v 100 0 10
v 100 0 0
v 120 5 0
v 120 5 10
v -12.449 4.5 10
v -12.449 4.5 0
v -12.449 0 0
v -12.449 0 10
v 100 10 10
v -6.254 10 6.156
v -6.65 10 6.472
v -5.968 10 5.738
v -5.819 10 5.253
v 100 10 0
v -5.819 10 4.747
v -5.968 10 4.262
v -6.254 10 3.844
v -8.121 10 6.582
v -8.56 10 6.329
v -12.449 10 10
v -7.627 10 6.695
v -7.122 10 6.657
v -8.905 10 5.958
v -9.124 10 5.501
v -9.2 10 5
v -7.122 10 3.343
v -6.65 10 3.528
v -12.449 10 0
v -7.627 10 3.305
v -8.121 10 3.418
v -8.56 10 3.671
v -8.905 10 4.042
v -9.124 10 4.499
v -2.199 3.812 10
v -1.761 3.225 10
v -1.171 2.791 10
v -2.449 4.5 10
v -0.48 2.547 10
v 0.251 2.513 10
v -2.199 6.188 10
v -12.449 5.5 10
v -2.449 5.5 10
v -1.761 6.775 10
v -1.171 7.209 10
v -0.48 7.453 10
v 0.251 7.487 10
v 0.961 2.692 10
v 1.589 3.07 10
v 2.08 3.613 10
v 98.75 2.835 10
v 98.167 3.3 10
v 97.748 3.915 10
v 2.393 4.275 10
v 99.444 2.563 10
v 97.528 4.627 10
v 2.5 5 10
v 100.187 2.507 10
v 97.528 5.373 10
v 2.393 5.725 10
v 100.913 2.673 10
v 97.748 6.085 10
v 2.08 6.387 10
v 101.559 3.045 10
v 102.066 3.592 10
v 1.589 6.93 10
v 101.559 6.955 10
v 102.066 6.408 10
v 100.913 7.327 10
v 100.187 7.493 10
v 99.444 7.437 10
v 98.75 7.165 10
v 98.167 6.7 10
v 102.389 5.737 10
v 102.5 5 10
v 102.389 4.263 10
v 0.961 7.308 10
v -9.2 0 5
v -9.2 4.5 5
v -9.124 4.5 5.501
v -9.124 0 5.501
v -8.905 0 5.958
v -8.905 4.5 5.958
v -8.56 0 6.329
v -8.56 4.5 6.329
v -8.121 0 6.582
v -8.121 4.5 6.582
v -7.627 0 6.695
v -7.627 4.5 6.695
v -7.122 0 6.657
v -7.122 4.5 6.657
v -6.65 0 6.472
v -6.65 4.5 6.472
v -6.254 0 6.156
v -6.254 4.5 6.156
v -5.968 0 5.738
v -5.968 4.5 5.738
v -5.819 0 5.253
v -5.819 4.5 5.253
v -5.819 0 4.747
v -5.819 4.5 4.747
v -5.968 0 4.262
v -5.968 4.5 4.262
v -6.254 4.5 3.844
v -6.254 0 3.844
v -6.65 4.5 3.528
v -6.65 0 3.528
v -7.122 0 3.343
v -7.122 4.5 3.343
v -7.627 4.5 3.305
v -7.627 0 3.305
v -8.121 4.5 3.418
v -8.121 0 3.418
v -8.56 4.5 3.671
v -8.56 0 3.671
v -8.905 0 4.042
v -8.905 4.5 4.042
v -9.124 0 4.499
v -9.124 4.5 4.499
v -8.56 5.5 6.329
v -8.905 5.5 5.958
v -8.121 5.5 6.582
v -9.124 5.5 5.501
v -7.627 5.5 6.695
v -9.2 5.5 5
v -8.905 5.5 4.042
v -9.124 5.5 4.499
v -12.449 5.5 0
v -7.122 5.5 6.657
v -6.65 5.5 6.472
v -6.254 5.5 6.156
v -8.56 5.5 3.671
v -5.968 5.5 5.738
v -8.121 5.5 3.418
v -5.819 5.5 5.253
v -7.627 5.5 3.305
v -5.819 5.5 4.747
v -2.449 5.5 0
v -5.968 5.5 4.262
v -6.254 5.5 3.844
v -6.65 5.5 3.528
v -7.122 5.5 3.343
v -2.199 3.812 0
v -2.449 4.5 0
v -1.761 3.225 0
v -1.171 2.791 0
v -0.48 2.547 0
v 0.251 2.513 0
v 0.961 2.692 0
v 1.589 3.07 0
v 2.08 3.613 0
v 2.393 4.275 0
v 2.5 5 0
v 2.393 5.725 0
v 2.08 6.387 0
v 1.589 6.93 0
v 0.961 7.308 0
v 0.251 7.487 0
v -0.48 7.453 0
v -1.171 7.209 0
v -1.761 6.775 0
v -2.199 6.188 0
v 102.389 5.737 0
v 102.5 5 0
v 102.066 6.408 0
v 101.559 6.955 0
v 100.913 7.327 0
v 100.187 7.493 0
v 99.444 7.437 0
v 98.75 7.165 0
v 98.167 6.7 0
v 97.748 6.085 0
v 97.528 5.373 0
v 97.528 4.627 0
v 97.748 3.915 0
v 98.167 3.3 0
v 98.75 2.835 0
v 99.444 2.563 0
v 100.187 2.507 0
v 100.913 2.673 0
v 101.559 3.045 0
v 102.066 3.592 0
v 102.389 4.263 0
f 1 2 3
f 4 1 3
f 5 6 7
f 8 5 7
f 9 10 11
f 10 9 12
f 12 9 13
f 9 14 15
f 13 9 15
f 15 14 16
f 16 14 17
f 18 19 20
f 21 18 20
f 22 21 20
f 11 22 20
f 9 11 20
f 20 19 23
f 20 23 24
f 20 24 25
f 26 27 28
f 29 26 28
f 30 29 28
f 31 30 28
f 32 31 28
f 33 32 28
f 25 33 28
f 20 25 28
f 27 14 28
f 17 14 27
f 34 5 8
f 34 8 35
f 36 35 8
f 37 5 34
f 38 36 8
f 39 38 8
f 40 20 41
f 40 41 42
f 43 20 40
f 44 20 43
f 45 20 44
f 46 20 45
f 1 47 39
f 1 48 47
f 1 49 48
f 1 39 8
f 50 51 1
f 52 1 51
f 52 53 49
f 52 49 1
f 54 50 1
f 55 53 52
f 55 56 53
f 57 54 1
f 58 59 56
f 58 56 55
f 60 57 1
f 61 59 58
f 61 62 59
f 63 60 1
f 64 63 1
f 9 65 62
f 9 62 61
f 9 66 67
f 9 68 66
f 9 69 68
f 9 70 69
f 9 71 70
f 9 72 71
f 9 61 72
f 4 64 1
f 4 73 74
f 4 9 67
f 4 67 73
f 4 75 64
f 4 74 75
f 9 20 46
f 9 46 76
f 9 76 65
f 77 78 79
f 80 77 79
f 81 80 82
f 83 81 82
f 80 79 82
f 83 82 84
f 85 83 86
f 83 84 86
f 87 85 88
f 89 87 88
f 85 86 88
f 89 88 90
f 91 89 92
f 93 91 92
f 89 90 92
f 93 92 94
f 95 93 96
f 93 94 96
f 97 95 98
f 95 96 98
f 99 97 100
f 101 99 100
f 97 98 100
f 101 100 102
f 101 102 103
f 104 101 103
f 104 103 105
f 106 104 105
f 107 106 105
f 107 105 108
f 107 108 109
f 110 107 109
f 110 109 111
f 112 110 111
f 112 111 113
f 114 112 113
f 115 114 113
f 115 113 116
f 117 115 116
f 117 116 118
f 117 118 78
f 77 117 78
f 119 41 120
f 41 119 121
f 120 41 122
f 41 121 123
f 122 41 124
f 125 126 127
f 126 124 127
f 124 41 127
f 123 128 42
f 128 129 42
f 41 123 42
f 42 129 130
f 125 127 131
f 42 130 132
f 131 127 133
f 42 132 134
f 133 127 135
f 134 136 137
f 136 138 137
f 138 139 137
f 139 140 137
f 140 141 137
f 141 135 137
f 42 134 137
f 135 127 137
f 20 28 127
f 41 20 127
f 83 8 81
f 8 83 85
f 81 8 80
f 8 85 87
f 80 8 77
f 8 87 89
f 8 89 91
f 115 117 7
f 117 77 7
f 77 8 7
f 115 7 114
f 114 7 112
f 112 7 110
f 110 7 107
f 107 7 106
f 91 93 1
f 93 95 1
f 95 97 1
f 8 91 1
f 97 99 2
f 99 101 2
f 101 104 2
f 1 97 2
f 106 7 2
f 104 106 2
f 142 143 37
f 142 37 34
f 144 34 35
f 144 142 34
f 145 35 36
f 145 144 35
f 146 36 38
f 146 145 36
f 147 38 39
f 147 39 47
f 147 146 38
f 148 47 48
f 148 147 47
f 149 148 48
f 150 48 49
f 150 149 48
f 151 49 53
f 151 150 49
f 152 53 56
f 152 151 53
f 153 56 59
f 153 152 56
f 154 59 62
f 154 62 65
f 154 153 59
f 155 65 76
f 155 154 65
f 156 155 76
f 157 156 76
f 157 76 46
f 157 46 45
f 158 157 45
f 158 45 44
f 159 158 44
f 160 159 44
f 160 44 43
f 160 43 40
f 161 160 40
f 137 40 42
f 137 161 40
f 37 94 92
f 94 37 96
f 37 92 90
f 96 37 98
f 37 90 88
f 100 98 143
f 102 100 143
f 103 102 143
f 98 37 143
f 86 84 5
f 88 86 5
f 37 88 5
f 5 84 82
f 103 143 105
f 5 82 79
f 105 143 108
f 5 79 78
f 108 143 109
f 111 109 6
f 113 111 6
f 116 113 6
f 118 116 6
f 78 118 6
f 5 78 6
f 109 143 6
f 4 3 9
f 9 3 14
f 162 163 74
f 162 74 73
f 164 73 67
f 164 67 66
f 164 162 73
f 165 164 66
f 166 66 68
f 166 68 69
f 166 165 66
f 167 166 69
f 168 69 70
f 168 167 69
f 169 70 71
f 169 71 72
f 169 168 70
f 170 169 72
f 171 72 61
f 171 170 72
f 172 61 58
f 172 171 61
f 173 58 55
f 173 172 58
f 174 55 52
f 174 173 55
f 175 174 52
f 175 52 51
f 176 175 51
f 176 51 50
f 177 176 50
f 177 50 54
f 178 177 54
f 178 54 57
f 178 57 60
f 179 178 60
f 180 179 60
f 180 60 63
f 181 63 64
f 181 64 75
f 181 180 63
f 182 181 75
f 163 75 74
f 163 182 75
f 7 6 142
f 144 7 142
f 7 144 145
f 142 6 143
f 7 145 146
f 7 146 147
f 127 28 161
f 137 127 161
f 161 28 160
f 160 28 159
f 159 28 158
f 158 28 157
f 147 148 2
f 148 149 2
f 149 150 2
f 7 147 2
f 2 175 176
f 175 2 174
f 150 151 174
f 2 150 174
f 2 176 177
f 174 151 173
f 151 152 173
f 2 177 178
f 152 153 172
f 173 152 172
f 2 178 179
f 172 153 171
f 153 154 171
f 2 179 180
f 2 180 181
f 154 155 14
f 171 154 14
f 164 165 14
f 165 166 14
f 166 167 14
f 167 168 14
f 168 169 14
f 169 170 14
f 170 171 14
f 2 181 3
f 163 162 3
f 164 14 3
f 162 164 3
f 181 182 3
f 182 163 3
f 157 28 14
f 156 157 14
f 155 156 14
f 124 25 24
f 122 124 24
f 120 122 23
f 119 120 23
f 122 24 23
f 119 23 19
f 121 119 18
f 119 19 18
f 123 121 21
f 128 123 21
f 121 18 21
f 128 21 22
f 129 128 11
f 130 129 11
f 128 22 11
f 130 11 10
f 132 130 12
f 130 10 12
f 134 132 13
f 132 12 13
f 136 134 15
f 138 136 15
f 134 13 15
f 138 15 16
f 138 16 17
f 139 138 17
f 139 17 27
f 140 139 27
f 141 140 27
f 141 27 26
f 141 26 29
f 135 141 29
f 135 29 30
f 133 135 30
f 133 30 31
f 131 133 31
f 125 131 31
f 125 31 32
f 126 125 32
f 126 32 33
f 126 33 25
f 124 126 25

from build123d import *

# Parameters (mm, degrees)
SKETCH001_R  = 2.5
PAD_DEPTH    = 10
SKETCH_R     = 1.7
POCKET_DEPTH = 12


with BuildPart() as part:
    # Sketch001 → Pad (new body)
    with BuildSketch(Plane.XY):
        with BuildLine():
            Line((0, 0), (100, 0))
            Line((100, 0), (120, 5))
            Line((120, 5), (100, 10))
            Line((100, 10), (-12.44949, 10))
            Line((-12.44949, 10), (-12.44949, 5.5))
            Line((-12.44949, 5.5), (-2.44949, 5.5))
            ThreePointArc((-2.44949, 4.5), (2.5, 5), (-2.44949, 5.5))
            Line((-2.44949, 4.5), (-12.44949, 4.5))
            Line((-12.44949, 4.5), (-12.44949, 0))
            Line((-12.44949, 0), (0, 0))
        make_face()
        with Locations((100, 5)):
            Circle(SKETCH001_R, mode=Mode.SUBTRACT)
    extrude(amount=PAD_DEPTH)

    # Sketch (on Face7 of Pad) → Pocket (cut)
    with BuildSketch(Plane(origin=(0, 10, 0), x_dir=(-1, 0, 0), z_dir=(0, 1, 0))):
        with Locations((7.5, 5)):
            Circle(SKETCH_R)
    extrude(amount=-POCKET_DEPTH, mode=Mode.SUBTRACT)


solid = part.part
